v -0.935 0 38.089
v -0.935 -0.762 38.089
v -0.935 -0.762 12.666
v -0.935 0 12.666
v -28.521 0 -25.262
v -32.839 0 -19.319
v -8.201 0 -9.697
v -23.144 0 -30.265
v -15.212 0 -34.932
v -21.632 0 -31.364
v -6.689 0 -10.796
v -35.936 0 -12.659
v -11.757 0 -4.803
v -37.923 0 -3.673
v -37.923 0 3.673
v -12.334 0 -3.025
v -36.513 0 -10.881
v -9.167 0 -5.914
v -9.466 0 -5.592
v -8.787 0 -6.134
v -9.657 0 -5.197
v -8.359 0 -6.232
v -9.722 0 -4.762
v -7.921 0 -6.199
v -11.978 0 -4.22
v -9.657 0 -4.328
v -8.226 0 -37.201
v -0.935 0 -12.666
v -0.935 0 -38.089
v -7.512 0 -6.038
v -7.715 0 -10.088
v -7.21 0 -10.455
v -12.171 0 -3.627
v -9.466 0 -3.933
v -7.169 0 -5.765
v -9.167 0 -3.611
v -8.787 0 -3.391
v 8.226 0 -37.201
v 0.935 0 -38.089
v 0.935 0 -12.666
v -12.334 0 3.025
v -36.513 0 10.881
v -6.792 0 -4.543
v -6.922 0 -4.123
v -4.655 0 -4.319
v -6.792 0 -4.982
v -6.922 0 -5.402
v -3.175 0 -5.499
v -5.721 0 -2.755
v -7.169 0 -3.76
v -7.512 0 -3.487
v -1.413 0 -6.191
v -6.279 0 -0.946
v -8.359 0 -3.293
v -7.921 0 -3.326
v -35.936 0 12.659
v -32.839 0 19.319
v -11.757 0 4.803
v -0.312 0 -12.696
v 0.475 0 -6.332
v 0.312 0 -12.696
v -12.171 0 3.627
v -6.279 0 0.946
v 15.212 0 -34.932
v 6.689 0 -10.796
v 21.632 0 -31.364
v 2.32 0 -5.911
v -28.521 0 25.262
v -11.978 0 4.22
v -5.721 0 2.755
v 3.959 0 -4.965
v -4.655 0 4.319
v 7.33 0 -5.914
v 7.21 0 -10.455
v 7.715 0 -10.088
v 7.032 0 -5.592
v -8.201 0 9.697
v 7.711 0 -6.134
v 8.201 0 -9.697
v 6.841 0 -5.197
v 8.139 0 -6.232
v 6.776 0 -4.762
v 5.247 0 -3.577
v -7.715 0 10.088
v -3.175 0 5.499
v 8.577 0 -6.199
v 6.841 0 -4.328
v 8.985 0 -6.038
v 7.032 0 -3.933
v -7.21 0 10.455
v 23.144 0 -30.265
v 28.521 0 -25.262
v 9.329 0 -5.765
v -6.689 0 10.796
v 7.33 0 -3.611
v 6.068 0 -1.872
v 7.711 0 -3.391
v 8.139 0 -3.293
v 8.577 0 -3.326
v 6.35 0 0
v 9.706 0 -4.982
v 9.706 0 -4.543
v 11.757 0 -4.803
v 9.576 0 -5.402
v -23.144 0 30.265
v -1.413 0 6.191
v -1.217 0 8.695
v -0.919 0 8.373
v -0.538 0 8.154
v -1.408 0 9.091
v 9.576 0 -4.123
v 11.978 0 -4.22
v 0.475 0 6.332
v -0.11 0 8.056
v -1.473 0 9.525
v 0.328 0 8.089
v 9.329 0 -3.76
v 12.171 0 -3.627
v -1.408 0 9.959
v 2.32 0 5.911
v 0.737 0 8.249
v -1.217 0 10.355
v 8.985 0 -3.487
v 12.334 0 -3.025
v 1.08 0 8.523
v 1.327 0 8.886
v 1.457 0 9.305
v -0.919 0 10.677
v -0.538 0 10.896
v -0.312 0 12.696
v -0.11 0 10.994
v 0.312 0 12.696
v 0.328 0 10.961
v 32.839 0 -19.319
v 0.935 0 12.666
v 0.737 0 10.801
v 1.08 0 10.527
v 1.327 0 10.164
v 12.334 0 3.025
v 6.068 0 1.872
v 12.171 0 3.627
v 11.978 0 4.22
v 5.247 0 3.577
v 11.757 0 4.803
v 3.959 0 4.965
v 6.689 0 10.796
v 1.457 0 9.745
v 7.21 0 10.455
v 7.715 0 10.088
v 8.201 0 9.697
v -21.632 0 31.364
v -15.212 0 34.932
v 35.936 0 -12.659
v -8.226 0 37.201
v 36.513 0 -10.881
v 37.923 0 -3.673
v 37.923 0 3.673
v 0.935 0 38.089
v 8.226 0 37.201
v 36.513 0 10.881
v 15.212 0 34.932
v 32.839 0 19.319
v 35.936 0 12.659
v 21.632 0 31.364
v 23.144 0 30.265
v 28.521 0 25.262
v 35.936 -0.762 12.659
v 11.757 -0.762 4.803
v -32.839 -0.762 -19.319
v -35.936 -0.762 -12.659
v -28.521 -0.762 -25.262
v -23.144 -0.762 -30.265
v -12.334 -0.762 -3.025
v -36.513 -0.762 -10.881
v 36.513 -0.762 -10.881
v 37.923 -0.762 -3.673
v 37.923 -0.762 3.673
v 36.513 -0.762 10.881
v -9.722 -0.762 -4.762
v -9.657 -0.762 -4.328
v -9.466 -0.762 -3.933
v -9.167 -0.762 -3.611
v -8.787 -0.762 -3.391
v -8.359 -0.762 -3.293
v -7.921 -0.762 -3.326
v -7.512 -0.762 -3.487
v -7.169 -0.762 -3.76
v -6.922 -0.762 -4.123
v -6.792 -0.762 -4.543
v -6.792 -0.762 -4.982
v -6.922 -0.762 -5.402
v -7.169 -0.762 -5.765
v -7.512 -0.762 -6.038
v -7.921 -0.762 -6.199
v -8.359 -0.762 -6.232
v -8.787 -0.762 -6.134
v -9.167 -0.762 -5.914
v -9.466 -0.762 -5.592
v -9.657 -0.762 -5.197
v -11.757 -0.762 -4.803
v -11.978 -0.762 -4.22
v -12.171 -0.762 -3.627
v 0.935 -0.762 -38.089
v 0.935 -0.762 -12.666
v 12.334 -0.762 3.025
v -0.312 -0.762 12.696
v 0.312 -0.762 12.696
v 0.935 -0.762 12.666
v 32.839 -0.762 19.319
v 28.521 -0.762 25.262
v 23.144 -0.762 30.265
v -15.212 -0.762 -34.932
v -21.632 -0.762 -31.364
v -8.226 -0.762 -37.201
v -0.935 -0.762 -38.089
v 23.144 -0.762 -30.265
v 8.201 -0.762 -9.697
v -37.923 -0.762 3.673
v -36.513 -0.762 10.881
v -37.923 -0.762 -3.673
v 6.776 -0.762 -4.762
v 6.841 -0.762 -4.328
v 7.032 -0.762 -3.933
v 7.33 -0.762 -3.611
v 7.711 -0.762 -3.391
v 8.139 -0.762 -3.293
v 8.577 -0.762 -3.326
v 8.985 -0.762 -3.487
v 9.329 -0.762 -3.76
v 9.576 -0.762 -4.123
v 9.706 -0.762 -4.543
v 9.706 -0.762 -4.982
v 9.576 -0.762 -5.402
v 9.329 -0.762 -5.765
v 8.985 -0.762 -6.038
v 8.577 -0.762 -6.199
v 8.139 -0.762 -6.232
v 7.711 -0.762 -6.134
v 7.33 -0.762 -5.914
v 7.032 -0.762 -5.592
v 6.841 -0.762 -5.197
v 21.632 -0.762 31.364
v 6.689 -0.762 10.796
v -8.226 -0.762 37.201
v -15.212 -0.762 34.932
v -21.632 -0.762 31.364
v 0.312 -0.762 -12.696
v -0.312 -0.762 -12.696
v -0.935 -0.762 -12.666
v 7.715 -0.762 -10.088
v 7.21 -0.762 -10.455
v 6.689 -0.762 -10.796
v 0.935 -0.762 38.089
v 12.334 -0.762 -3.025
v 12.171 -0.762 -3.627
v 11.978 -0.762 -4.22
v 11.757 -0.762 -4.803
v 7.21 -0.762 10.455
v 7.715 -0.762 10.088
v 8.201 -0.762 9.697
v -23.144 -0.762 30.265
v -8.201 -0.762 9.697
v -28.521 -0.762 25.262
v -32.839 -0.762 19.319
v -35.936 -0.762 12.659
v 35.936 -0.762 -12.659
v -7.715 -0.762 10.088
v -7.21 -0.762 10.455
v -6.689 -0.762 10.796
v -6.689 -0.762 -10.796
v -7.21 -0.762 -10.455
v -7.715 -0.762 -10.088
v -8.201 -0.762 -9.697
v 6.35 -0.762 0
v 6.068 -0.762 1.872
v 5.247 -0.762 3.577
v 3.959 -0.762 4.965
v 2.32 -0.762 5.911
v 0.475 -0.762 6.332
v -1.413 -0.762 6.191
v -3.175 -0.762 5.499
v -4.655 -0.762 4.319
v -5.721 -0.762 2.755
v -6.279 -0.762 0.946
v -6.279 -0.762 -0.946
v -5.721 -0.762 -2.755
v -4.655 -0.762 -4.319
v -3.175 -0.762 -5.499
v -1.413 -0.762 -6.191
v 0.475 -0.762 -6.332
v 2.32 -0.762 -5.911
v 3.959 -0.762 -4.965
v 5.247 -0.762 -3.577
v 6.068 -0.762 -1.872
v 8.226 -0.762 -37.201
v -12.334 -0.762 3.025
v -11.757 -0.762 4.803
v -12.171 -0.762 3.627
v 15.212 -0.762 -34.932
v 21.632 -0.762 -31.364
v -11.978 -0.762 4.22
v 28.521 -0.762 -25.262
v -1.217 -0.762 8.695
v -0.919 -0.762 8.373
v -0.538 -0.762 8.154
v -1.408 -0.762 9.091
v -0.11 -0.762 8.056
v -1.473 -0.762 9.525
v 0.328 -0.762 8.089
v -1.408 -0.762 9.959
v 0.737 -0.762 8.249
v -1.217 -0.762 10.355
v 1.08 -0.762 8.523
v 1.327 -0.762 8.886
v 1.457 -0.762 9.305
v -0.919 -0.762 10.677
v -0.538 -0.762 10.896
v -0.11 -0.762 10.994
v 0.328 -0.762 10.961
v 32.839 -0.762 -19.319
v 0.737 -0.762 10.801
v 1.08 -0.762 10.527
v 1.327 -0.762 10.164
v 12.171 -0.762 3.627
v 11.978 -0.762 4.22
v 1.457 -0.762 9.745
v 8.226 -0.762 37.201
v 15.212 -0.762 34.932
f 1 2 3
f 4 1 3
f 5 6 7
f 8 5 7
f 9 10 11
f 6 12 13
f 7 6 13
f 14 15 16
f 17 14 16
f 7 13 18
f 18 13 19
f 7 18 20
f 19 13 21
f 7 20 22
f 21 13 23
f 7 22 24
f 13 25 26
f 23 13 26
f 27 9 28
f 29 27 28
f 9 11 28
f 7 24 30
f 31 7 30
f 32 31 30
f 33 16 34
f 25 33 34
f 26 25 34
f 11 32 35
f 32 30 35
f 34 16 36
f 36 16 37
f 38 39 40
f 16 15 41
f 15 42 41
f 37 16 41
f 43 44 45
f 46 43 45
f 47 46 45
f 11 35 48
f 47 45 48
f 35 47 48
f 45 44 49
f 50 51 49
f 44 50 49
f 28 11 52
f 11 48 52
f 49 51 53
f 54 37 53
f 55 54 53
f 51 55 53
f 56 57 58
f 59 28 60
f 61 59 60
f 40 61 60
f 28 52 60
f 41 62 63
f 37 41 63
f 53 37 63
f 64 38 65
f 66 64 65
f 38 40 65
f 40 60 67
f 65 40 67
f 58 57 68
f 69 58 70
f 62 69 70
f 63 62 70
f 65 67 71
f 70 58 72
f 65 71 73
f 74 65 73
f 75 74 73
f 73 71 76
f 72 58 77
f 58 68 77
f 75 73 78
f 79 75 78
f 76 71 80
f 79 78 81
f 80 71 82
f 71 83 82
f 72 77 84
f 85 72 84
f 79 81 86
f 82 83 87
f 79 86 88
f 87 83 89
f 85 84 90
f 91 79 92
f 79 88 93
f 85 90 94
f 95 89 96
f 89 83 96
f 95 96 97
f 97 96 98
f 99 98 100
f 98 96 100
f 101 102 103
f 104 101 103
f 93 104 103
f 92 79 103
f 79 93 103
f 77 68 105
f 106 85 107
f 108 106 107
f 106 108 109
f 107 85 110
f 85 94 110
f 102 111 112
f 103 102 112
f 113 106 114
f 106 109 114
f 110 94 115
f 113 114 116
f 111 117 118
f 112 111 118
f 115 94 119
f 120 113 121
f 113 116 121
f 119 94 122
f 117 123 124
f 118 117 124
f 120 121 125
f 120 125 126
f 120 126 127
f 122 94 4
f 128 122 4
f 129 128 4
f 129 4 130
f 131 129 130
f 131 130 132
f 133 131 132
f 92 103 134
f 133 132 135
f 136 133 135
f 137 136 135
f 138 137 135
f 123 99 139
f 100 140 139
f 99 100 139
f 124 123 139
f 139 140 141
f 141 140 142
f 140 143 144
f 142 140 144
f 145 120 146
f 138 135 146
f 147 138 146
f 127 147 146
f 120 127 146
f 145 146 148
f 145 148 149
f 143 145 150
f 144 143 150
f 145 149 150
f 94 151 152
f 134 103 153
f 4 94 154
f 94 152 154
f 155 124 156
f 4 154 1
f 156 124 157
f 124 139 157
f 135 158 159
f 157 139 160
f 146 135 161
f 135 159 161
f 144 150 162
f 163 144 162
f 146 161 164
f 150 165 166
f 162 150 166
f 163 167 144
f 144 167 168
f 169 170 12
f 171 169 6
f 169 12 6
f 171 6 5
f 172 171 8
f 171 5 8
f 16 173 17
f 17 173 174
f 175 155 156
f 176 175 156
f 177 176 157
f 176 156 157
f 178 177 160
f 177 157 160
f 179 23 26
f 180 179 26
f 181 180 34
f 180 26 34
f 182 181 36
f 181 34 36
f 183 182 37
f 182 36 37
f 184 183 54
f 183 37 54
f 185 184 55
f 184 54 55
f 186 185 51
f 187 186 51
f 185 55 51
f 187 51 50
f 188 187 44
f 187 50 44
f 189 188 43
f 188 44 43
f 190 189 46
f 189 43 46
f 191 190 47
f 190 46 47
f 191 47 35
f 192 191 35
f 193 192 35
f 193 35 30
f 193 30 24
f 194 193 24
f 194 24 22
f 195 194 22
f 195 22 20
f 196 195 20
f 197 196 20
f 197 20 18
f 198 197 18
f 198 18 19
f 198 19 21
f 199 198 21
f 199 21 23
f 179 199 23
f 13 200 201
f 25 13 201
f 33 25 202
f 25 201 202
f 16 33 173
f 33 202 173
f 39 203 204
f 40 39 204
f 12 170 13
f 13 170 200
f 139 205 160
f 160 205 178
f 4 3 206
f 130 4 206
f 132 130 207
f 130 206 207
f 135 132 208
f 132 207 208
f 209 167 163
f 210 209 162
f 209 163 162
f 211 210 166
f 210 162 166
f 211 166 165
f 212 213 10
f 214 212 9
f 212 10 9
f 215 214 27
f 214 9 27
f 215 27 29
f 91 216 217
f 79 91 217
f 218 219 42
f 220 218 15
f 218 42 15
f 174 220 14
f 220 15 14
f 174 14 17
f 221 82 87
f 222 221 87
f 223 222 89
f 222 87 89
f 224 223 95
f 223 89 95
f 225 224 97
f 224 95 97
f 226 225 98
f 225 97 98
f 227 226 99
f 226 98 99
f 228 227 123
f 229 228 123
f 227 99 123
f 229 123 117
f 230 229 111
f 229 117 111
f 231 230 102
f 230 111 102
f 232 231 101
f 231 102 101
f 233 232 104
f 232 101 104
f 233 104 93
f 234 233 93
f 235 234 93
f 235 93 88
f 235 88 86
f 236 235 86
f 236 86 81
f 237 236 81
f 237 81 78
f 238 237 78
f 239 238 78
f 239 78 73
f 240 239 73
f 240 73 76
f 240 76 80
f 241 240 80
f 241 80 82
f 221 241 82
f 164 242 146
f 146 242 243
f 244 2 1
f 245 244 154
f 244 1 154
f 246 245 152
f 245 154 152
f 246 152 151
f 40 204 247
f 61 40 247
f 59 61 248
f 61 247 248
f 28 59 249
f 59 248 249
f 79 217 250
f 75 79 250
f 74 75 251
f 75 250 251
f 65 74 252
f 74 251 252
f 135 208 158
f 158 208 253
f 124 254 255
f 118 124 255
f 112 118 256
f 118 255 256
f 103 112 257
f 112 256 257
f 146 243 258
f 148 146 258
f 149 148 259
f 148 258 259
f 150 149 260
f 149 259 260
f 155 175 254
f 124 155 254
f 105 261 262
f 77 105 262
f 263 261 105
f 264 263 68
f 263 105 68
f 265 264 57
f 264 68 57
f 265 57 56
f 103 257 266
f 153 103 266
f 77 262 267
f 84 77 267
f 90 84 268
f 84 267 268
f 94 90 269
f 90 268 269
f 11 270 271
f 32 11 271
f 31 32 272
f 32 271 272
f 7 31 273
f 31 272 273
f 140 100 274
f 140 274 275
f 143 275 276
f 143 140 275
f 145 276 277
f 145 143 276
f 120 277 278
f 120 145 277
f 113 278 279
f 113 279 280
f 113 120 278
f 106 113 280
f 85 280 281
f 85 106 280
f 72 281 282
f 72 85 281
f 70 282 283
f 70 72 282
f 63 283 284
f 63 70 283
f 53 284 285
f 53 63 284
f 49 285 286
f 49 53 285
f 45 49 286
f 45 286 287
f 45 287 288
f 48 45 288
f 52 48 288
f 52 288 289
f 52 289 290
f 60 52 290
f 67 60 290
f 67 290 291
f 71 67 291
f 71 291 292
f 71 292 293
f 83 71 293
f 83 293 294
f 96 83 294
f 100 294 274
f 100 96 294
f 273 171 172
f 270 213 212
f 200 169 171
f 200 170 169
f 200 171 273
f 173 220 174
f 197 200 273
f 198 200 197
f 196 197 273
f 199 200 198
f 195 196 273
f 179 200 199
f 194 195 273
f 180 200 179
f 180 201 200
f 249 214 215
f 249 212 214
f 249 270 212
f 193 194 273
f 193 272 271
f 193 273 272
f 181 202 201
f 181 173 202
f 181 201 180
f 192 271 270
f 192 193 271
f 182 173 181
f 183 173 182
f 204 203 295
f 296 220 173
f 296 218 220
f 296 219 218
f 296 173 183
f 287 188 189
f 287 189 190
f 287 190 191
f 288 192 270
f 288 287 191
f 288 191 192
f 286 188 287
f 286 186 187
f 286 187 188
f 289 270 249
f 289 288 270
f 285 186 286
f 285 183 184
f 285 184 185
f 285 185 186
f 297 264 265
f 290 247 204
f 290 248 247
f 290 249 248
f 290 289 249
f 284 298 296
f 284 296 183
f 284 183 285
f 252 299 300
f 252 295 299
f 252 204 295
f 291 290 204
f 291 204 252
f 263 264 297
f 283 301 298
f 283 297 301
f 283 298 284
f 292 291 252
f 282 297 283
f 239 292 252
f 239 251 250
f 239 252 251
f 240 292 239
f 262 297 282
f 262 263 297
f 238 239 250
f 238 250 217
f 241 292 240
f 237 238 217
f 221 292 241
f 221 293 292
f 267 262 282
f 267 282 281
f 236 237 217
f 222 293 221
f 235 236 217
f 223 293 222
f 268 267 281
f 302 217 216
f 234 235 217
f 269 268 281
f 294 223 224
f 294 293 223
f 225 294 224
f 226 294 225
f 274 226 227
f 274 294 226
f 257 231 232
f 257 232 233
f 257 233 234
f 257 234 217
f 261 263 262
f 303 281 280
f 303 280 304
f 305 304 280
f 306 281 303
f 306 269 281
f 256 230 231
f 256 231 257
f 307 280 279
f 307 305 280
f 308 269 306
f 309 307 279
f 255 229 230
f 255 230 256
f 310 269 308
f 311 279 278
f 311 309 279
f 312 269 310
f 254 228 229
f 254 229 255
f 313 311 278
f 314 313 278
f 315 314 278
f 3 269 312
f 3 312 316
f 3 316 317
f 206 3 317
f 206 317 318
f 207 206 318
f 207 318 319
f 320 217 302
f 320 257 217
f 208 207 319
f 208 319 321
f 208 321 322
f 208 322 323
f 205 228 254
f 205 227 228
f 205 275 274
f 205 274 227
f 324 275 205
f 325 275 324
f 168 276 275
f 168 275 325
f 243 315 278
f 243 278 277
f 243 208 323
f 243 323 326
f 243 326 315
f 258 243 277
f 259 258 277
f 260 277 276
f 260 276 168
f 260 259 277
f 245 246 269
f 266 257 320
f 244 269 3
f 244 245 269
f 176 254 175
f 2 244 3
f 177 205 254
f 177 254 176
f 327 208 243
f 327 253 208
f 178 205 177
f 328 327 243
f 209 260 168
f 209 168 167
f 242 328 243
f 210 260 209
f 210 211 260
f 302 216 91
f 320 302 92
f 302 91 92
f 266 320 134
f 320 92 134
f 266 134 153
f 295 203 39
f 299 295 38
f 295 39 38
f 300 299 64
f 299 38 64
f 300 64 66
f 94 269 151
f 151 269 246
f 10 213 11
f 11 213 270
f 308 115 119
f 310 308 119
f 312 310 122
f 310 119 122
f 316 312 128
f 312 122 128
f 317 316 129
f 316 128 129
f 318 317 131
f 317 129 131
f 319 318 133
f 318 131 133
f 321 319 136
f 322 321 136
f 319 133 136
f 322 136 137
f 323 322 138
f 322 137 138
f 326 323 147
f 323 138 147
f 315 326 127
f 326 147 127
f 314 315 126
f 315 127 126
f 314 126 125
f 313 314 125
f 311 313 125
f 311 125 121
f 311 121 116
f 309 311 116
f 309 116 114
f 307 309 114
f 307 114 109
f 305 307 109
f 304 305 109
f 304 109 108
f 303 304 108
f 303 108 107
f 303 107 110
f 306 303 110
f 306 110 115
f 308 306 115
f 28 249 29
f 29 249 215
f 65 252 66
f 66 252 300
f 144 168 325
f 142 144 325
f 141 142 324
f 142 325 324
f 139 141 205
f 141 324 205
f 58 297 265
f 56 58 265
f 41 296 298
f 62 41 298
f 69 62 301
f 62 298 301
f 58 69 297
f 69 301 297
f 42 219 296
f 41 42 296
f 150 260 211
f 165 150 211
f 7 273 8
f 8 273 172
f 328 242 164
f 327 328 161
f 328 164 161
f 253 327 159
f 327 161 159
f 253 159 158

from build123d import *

# Parameters (mm, degrees)
F0_R            = 38.1
F0_R_2          = 6.35
F1_DEPTH        = 0.762
F3_DEPTH        = 0.763
F3_COPIES_COUNT = 10
F5_D            = 2.9464


# Not quite as in the source:
# - a pattern or mirror of a feature is missing from the dataset's text; its kind, count and spacing are read off the source's solid


with BuildPart() as f1:
    # F0 (on Front) → F1 (new body)
    with BuildSketch(Plane.XZ):
        Circle(F0_R)
        Circle(F0_R_2, mode=Mode.SUBTRACT)
    extrude(amount=F1_DEPTH)

    # F2 (on face) → F3 (cut, through all)
    with BuildSketch(Plane.XZ.offset(0.762)):
        with BuildLine():
            Line((-0.9345413193, 38.0885367601), (-0.9345413193, 12.6655687801))
            ThreePointArc((-0.9345413193, 12.6655687801), (0, 12.7), (0.9345413193, 12.6655687801))
            Line((0.9345413193, 12.6655687801), (0.9345413193, 38.0885367601))
            ThreePointArc((0.9345413193, 38.0885367601), (0, 38.1), (-0.9345413193, 38.0885367601))
        make_face()
    f3 = extrude(amount=-F3_DEPTH, mode=Mode.SUBTRACT)

    # F3_copies: F3 ×10 about axis
    f3_copies_axis = Axis((0, 0, 0), (0, 1, 0))
    for i in range(1, F3_COPIES_COUNT):
        add(f3.rotate(f3_copies_axis, i * 360 / F3_COPIES_COUNT), mode=Mode.SUBTRACT)

    # F5 (through all)
    with Locations(Plane.XZ.offset(0.762)):
        with Locations((0, 9.525), (-8.248891971, -4.7625), (8.248891971, -4.7625)):
            Hole(F5_D / 2)


solid = f1.part
